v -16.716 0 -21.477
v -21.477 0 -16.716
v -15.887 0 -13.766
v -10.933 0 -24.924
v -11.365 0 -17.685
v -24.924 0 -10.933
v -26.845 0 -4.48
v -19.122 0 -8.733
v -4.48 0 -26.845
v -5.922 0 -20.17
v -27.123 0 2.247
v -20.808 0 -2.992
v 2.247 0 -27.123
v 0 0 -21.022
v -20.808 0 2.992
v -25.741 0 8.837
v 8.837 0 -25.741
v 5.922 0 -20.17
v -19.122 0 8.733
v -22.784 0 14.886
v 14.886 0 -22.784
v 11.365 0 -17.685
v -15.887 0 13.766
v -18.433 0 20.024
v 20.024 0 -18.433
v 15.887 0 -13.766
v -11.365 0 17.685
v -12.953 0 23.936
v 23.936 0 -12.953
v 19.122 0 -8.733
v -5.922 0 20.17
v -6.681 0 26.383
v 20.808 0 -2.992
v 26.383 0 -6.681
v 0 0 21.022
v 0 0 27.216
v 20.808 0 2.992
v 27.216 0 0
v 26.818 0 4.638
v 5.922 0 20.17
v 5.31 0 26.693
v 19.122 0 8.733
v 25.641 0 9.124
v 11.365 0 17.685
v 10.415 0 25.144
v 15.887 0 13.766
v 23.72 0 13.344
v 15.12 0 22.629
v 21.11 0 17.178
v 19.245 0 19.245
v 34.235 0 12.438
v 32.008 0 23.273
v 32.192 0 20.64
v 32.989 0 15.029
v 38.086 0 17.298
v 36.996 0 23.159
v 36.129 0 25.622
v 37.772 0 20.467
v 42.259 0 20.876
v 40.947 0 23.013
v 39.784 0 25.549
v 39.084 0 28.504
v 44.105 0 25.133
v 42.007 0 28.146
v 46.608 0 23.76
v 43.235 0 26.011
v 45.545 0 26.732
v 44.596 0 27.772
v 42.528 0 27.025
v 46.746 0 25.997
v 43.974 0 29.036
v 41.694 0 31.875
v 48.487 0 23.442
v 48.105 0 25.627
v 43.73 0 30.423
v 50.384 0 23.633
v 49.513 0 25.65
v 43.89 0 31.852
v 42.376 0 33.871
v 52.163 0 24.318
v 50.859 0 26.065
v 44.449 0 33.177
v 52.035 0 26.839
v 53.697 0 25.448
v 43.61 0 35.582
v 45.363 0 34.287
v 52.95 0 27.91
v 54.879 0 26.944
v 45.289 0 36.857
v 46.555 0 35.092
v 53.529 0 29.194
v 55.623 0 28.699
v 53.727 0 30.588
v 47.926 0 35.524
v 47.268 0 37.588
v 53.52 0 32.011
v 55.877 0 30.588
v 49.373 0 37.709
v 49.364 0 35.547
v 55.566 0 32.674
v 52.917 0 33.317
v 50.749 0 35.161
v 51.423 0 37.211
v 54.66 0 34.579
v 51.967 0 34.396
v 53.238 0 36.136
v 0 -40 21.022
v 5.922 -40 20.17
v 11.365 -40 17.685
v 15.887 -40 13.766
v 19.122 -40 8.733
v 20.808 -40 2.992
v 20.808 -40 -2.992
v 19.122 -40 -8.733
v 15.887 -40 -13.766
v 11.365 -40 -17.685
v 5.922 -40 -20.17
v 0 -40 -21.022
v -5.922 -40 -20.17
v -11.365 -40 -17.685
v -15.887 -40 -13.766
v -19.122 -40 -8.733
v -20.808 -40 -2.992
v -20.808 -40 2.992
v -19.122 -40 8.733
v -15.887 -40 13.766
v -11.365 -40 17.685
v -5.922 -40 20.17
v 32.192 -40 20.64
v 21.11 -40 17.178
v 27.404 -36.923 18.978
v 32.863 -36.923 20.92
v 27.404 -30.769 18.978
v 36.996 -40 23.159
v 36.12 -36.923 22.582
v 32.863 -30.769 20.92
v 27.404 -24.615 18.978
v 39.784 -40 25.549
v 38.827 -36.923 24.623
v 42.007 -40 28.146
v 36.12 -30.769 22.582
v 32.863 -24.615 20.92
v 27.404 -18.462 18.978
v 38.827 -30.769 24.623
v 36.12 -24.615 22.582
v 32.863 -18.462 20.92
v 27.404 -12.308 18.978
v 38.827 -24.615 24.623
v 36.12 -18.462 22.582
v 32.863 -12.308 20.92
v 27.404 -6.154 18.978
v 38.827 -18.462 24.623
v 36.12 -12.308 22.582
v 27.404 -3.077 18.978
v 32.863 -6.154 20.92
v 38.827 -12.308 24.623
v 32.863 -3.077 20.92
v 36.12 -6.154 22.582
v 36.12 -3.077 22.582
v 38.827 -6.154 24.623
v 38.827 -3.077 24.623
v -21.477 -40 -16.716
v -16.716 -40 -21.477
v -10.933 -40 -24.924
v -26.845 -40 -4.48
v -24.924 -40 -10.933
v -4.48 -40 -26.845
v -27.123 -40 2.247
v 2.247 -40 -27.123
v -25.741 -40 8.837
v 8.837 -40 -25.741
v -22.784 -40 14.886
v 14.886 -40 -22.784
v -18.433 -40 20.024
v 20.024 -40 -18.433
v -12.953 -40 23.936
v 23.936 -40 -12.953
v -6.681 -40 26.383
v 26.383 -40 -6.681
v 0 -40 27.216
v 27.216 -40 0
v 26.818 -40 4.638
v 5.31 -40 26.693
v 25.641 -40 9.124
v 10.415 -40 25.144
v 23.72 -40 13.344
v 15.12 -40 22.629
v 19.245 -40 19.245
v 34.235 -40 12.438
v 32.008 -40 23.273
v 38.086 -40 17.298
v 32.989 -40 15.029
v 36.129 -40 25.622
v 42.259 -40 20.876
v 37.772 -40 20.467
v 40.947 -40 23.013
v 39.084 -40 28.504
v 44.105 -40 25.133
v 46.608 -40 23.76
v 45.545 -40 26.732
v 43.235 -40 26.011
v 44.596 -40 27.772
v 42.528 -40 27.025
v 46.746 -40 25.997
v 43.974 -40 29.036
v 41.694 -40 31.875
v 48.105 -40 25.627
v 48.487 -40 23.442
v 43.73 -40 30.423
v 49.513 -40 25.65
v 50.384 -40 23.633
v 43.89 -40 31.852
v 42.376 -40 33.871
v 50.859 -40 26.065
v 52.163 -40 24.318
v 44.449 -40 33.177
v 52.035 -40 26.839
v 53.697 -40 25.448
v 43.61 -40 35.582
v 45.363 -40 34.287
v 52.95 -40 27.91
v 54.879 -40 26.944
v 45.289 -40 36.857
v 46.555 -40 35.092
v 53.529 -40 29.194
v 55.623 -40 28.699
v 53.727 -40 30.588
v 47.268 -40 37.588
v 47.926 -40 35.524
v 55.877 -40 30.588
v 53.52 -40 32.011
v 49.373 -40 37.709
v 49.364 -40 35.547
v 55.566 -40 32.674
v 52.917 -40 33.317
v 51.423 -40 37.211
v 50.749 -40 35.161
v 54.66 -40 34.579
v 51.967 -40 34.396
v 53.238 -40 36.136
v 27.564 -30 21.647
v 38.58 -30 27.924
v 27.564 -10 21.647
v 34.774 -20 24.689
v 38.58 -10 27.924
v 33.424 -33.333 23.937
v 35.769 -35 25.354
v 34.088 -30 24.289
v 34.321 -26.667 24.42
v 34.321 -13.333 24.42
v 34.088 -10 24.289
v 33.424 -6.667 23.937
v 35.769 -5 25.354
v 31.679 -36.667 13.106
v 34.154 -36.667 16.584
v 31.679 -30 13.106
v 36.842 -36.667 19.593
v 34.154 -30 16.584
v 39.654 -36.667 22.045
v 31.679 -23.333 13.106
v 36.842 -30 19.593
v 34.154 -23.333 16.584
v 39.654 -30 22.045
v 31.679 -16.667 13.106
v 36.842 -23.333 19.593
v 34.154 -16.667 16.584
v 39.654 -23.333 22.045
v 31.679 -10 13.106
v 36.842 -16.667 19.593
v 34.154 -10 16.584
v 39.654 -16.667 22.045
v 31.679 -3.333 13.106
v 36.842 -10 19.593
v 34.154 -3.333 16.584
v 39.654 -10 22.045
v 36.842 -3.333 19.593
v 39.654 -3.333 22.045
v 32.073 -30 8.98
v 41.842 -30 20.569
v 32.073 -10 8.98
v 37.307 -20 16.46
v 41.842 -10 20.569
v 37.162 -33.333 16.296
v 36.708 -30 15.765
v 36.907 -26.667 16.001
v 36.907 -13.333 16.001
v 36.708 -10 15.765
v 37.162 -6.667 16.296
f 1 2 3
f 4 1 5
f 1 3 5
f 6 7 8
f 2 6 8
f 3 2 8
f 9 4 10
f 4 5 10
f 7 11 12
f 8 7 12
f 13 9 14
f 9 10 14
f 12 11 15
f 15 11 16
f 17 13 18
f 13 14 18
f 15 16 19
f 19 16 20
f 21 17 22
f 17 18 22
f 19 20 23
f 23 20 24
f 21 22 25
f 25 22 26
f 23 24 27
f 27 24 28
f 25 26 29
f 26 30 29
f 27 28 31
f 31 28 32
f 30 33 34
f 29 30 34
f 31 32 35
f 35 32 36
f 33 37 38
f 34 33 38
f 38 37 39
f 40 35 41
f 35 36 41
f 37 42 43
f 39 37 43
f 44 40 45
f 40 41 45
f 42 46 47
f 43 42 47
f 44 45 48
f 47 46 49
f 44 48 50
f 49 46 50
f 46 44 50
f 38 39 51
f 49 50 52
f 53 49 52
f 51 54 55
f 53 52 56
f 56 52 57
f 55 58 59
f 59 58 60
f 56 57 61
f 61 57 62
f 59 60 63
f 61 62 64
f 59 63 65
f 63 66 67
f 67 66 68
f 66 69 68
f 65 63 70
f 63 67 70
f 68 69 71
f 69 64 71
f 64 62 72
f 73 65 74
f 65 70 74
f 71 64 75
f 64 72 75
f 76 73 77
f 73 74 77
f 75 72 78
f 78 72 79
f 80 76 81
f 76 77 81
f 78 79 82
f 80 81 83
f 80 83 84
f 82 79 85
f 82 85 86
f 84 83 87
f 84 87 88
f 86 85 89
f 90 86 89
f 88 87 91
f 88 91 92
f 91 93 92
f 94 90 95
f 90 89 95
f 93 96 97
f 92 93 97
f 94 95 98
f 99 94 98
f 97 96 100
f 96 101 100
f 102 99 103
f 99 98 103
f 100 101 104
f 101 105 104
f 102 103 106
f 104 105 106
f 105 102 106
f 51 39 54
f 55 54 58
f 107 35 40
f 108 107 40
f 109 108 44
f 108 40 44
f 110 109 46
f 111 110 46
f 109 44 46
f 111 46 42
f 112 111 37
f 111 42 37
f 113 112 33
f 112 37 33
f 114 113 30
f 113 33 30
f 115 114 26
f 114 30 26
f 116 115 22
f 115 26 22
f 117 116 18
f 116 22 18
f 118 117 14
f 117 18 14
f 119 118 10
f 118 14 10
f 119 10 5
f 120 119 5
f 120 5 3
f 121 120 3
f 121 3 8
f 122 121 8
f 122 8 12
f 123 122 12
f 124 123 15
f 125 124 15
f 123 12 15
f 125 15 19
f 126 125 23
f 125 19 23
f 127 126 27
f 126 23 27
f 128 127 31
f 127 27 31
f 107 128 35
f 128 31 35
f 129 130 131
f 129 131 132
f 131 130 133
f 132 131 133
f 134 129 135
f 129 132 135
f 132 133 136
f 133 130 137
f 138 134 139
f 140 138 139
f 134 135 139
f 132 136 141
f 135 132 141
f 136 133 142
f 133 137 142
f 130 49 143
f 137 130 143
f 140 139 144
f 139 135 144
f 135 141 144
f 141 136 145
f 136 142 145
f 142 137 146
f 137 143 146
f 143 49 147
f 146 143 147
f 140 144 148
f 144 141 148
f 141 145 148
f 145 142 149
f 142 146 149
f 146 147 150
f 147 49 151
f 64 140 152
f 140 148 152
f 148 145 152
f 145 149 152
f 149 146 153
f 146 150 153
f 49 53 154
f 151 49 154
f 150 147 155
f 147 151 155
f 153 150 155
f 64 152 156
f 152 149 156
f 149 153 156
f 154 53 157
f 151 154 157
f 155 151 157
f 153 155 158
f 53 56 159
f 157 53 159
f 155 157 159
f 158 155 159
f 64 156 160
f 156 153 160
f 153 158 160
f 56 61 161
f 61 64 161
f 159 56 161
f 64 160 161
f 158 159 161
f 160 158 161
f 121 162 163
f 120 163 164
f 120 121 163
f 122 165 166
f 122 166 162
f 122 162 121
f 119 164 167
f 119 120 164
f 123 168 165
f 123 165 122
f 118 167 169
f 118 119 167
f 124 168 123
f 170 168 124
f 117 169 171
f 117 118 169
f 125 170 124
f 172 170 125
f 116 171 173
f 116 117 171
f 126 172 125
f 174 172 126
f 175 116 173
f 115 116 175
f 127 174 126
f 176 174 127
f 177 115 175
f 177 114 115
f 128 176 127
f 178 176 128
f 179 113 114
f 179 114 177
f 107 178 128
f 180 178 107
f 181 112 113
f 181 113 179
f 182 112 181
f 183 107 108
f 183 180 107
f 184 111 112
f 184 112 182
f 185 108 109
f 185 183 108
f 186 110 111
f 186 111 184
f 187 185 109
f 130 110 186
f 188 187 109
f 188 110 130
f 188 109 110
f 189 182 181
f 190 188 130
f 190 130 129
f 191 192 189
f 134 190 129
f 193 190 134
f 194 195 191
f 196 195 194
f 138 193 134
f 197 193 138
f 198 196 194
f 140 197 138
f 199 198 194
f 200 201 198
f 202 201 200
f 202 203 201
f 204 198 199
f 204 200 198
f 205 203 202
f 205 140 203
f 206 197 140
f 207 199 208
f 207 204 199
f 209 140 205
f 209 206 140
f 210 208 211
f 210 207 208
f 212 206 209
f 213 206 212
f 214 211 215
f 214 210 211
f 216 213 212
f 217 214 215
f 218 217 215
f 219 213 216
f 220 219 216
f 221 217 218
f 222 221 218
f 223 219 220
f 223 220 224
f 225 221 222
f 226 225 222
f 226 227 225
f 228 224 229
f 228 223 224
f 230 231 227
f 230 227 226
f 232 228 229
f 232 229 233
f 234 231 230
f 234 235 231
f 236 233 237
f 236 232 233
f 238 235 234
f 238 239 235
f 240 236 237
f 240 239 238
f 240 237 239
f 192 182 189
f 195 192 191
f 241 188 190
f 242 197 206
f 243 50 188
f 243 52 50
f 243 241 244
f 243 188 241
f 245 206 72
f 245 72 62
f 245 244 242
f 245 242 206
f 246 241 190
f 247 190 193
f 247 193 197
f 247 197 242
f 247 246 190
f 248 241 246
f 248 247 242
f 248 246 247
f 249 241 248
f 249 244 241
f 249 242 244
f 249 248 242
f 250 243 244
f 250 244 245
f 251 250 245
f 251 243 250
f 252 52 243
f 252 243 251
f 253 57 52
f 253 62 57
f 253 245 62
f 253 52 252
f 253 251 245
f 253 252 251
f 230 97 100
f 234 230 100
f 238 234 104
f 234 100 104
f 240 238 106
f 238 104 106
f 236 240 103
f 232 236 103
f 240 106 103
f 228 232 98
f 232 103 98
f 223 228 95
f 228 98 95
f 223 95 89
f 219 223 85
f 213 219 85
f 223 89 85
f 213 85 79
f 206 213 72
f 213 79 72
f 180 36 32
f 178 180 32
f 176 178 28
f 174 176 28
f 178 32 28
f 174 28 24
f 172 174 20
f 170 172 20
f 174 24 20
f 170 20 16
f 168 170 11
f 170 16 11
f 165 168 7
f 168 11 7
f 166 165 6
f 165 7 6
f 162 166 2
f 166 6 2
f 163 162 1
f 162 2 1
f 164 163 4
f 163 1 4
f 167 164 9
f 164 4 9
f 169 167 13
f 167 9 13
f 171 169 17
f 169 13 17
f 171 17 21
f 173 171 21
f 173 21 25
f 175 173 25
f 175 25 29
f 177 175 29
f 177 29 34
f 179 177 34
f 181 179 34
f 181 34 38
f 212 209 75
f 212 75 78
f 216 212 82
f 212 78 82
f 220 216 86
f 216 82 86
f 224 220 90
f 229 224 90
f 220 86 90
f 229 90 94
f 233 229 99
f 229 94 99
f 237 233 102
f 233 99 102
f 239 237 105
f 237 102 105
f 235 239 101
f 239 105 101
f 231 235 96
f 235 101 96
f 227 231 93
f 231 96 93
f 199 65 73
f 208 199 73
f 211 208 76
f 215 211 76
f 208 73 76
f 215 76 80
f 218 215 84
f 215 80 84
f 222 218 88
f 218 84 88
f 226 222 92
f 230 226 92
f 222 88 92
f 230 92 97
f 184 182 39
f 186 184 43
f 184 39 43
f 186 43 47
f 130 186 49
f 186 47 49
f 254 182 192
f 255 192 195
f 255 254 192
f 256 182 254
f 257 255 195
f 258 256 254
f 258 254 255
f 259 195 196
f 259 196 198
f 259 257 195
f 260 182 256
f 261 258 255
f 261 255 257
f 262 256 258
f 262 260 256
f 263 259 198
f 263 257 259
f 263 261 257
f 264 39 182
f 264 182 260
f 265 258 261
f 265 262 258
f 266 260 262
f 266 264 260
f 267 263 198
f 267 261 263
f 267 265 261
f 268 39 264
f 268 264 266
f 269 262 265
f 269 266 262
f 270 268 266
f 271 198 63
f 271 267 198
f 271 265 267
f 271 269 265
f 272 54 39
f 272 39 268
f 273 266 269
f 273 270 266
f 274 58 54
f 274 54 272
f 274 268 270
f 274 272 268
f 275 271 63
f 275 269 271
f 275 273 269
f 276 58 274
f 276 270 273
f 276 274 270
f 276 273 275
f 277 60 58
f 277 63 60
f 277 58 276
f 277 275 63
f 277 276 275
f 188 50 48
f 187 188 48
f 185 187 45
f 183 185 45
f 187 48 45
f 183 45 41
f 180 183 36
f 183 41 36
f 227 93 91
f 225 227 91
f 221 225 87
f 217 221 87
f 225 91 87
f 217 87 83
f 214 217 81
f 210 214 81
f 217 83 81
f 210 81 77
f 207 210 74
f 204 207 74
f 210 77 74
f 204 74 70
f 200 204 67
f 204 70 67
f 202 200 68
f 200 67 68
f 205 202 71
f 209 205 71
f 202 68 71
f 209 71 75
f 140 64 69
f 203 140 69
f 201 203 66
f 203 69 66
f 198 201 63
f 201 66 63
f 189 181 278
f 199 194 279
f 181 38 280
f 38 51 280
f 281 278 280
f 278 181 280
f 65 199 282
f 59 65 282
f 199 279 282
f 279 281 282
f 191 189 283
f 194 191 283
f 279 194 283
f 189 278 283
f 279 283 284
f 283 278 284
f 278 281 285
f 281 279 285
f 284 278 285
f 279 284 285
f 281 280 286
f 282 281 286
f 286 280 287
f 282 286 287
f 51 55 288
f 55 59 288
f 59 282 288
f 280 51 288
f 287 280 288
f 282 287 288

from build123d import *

# Parameters (mm, degrees)
F1_DEPTH = 40


# Not quite as in the source:
# - the dataset's text gives a spline's control points without its knots; the knots are read off the source's solid


with BuildPart() as f1:
    # F0 (on Front) → F1 (new body)
    with BuildSketch(Plane.XZ):
        with BuildLine():
            Line((14.8645307095, 14.8645307095), (19.2446576564, 19.2446576564))
            ThreePointArc((19.2446576564, 19.2446576564), (10.4151336723, 25.1443569656), (0, 27.2160558609))
            Line((0, 27.2160558609), (0, 21.0216209277))
            ThreePointArc((0, 21.0216209277), (8.0446260505, 19.4214453153), (14.8645307095, 14.8645307095))
        make_face()
        with BuildLine():
            add(Edge.make_bspline(
                [(19.2446576564, 19.2446576564), (24.6689861063, 20.8169419681), (35.6038275727, 23.3831834597), (39.5588464284, 29.0400313178), (41.6940481575, 31.8752741371)],
                knots=[0, 0, 0, 0, 0.5609906845, 0.9958506588, 0.9958506588, 0.9958506588, 0.9958506588], degree=3))
            ThreePointArc((19.2446576564, 19.2446576564), (20.2037869779, 18.2351498041), (21.1100269664, 17.1779061036))
            add(Edge.make_bspline(
                [(21.1100269664, 17.1779061036), (21.932882048, 17.4106073742), (24.0175916845, 17.9893669374), (27.419341518, 18.9554948799), (30.5229232771, 19.9727275496), (32.8770808493, 20.9067554384), (34.2794910559, 21.5551214884), (35.3497904598, 22.1226810179), (36.1267174841, 22.5777216487), (36.8651895753, 23.0595386993), (37.7916316161, 23.7289766273), (38.8502830375, 24.6135981903), (40.3593073263, 26.1032349307), (41.3483421725, 27.3012382121), (41.9852374937, 28.1182048261), (42.0071509342, 28.1463677389)],
                knots=[0.0404952119, 0.0404952119, 0.0404952119, 0.0404952119, 0.125, 0.25, 0.375, 0.4375, 0.5, 0.53125, 0.5625, 0.59375, 0.625, 0.6875, 0.75, 0.875, 0.8794611677, 0.8794611677, 0.8794611677, 0.8794611677], degree=3))
            ThreePointArc((42.0071509342, 28.1463677389), (41.602326035, 29.9899743097), (41.6940481575, 31.8752741371))
        make_face()
        with BuildLine():
            ThreePointArc((21.1100269664, 17.1779061036), (20.2037869779, 18.2351498041), (19.2446576564, 19.2446576564))
            Line((19.2446576564, 19.2446576564), (14.8645307095, 14.8645307095))
            ThreePointArc((14.8645307095, 14.8645307095), (19.4214453153, 8.0446260505), (21.0216209277, 0))
            Line((21.0216209277, 0), (27.2160558609, 0))
            ThreePointArc((27.2160558609, 0), (27.1163610427, 2.3273720003), (26.8180069698, 4.6376932618))
            ThreePointArc((26.8180069698, 4.6376932618), (24.7707154474, 11.2749879312), (21.1100269664, 17.1779061036))
        make_face()
        with BuildLine():
            Line((0, 21.0216209277), (0, 27.2160558609))
            ThreePointArc((0, 27.2160558609), (-19.2446576564, -19.2446576564), (27.2160558609, 0))
            Line((27.2160558609, 0), (21.0216209277, 0))
            ThreePointArc((21.0216209277, 0), (-14.8645307095, -14.8645307095), (0, 21.0216209277))
        make_face()
        with BuildLine():
            ThreePointArc((55.8771080393, 30.5882225912), (49.3733508957, 37.7088912623), (41.6940481575, 31.8752741371))
            ThreePointArc((41.6940481575, 31.8752741371), (41.602326035, 29.9899743097), (42.0071509342, 28.1463677389))
            ThreePointArc((42.0071509342, 28.1463677389), (42.8595475903, 26.5025969086), (44.1054687849, 25.1328367183))
            ThreePointArc((44.1054687849, 25.1328367183), (45.2874793483, 24.3200561007), (46.60794615, 23.7595842193))
            ThreePointArc((46.60794615, 23.7595842193), (52.9679994545, 24.8317552686), (55.8771080393, 30.5882225912))
        make_face()
        with BuildLine():
            ThreePointArc((53.7271809085, 30.5882225912), (48.8098673687, 25.588906343), (43.7299157288, 30.4228722856))
            ThreePointArc((43.7299157288, 30.4228722856), (48.6444944483, 35.5875388394), (53.7271809085, 30.5882225912))
        make_face(mode=Mode.SUBTRACT)
        with BuildLine():
            ThreePointArc((26.8180069698, 4.6376932618), (27.1163610427, 2.3273720003), (27.2160558609, 0))
            add(Edge.make_bspline(
                [(27.2160558609, 0), (30.4118613071, 6.1535153267), (36.1085642411, 17.1225033402), (43.4048284049, 21.734764605), (46.60794615, 23.7595842193)],
                knots=[0, 0, 0, 0, 0.5609920336, 1, 1, 1, 1], degree=3))
            ThreePointArc((46.60794615, 23.7595842193), (45.2874793483, 24.3200561007), (44.1054687849, 25.1328367183))
            add(Edge.make_bspline(
                [(26.8180069698, 4.6376932618), (26.9287178391, 4.8472219351), (27.763643844, 6.4224538826), (29.3467248011, 9.3274546207), (31.2690824478, 12.5225076847), (32.8847011617, 14.9107917128), (33.9343354718, 16.3212905579), (34.8023613487, 17.3919432452), (35.693376161, 18.4237208714), (36.8375292868, 19.6172523124), (38.236939936, 20.9022131544), (40.1258580525, 22.4490696098), (42.0976326485, 23.8377548069), (43.5711967417, 24.7916786126), (44.1054687849, 25.1328367183)],
                knots=[0.1058501262, 0.1058501262, 0.1058501262, 0.1058501262, 0.125, 0.25, 0.375, 0.4375, 0.5, 0.53125, 0.5625, 0.625, 0.6875, 0.75, 0.875, 0.9471213486, 0.9471213486, 0.9471213486, 0.9471213486], degree=3))
        make_face()
    extrude(amount=F1_DEPTH)


solid = f1.part
